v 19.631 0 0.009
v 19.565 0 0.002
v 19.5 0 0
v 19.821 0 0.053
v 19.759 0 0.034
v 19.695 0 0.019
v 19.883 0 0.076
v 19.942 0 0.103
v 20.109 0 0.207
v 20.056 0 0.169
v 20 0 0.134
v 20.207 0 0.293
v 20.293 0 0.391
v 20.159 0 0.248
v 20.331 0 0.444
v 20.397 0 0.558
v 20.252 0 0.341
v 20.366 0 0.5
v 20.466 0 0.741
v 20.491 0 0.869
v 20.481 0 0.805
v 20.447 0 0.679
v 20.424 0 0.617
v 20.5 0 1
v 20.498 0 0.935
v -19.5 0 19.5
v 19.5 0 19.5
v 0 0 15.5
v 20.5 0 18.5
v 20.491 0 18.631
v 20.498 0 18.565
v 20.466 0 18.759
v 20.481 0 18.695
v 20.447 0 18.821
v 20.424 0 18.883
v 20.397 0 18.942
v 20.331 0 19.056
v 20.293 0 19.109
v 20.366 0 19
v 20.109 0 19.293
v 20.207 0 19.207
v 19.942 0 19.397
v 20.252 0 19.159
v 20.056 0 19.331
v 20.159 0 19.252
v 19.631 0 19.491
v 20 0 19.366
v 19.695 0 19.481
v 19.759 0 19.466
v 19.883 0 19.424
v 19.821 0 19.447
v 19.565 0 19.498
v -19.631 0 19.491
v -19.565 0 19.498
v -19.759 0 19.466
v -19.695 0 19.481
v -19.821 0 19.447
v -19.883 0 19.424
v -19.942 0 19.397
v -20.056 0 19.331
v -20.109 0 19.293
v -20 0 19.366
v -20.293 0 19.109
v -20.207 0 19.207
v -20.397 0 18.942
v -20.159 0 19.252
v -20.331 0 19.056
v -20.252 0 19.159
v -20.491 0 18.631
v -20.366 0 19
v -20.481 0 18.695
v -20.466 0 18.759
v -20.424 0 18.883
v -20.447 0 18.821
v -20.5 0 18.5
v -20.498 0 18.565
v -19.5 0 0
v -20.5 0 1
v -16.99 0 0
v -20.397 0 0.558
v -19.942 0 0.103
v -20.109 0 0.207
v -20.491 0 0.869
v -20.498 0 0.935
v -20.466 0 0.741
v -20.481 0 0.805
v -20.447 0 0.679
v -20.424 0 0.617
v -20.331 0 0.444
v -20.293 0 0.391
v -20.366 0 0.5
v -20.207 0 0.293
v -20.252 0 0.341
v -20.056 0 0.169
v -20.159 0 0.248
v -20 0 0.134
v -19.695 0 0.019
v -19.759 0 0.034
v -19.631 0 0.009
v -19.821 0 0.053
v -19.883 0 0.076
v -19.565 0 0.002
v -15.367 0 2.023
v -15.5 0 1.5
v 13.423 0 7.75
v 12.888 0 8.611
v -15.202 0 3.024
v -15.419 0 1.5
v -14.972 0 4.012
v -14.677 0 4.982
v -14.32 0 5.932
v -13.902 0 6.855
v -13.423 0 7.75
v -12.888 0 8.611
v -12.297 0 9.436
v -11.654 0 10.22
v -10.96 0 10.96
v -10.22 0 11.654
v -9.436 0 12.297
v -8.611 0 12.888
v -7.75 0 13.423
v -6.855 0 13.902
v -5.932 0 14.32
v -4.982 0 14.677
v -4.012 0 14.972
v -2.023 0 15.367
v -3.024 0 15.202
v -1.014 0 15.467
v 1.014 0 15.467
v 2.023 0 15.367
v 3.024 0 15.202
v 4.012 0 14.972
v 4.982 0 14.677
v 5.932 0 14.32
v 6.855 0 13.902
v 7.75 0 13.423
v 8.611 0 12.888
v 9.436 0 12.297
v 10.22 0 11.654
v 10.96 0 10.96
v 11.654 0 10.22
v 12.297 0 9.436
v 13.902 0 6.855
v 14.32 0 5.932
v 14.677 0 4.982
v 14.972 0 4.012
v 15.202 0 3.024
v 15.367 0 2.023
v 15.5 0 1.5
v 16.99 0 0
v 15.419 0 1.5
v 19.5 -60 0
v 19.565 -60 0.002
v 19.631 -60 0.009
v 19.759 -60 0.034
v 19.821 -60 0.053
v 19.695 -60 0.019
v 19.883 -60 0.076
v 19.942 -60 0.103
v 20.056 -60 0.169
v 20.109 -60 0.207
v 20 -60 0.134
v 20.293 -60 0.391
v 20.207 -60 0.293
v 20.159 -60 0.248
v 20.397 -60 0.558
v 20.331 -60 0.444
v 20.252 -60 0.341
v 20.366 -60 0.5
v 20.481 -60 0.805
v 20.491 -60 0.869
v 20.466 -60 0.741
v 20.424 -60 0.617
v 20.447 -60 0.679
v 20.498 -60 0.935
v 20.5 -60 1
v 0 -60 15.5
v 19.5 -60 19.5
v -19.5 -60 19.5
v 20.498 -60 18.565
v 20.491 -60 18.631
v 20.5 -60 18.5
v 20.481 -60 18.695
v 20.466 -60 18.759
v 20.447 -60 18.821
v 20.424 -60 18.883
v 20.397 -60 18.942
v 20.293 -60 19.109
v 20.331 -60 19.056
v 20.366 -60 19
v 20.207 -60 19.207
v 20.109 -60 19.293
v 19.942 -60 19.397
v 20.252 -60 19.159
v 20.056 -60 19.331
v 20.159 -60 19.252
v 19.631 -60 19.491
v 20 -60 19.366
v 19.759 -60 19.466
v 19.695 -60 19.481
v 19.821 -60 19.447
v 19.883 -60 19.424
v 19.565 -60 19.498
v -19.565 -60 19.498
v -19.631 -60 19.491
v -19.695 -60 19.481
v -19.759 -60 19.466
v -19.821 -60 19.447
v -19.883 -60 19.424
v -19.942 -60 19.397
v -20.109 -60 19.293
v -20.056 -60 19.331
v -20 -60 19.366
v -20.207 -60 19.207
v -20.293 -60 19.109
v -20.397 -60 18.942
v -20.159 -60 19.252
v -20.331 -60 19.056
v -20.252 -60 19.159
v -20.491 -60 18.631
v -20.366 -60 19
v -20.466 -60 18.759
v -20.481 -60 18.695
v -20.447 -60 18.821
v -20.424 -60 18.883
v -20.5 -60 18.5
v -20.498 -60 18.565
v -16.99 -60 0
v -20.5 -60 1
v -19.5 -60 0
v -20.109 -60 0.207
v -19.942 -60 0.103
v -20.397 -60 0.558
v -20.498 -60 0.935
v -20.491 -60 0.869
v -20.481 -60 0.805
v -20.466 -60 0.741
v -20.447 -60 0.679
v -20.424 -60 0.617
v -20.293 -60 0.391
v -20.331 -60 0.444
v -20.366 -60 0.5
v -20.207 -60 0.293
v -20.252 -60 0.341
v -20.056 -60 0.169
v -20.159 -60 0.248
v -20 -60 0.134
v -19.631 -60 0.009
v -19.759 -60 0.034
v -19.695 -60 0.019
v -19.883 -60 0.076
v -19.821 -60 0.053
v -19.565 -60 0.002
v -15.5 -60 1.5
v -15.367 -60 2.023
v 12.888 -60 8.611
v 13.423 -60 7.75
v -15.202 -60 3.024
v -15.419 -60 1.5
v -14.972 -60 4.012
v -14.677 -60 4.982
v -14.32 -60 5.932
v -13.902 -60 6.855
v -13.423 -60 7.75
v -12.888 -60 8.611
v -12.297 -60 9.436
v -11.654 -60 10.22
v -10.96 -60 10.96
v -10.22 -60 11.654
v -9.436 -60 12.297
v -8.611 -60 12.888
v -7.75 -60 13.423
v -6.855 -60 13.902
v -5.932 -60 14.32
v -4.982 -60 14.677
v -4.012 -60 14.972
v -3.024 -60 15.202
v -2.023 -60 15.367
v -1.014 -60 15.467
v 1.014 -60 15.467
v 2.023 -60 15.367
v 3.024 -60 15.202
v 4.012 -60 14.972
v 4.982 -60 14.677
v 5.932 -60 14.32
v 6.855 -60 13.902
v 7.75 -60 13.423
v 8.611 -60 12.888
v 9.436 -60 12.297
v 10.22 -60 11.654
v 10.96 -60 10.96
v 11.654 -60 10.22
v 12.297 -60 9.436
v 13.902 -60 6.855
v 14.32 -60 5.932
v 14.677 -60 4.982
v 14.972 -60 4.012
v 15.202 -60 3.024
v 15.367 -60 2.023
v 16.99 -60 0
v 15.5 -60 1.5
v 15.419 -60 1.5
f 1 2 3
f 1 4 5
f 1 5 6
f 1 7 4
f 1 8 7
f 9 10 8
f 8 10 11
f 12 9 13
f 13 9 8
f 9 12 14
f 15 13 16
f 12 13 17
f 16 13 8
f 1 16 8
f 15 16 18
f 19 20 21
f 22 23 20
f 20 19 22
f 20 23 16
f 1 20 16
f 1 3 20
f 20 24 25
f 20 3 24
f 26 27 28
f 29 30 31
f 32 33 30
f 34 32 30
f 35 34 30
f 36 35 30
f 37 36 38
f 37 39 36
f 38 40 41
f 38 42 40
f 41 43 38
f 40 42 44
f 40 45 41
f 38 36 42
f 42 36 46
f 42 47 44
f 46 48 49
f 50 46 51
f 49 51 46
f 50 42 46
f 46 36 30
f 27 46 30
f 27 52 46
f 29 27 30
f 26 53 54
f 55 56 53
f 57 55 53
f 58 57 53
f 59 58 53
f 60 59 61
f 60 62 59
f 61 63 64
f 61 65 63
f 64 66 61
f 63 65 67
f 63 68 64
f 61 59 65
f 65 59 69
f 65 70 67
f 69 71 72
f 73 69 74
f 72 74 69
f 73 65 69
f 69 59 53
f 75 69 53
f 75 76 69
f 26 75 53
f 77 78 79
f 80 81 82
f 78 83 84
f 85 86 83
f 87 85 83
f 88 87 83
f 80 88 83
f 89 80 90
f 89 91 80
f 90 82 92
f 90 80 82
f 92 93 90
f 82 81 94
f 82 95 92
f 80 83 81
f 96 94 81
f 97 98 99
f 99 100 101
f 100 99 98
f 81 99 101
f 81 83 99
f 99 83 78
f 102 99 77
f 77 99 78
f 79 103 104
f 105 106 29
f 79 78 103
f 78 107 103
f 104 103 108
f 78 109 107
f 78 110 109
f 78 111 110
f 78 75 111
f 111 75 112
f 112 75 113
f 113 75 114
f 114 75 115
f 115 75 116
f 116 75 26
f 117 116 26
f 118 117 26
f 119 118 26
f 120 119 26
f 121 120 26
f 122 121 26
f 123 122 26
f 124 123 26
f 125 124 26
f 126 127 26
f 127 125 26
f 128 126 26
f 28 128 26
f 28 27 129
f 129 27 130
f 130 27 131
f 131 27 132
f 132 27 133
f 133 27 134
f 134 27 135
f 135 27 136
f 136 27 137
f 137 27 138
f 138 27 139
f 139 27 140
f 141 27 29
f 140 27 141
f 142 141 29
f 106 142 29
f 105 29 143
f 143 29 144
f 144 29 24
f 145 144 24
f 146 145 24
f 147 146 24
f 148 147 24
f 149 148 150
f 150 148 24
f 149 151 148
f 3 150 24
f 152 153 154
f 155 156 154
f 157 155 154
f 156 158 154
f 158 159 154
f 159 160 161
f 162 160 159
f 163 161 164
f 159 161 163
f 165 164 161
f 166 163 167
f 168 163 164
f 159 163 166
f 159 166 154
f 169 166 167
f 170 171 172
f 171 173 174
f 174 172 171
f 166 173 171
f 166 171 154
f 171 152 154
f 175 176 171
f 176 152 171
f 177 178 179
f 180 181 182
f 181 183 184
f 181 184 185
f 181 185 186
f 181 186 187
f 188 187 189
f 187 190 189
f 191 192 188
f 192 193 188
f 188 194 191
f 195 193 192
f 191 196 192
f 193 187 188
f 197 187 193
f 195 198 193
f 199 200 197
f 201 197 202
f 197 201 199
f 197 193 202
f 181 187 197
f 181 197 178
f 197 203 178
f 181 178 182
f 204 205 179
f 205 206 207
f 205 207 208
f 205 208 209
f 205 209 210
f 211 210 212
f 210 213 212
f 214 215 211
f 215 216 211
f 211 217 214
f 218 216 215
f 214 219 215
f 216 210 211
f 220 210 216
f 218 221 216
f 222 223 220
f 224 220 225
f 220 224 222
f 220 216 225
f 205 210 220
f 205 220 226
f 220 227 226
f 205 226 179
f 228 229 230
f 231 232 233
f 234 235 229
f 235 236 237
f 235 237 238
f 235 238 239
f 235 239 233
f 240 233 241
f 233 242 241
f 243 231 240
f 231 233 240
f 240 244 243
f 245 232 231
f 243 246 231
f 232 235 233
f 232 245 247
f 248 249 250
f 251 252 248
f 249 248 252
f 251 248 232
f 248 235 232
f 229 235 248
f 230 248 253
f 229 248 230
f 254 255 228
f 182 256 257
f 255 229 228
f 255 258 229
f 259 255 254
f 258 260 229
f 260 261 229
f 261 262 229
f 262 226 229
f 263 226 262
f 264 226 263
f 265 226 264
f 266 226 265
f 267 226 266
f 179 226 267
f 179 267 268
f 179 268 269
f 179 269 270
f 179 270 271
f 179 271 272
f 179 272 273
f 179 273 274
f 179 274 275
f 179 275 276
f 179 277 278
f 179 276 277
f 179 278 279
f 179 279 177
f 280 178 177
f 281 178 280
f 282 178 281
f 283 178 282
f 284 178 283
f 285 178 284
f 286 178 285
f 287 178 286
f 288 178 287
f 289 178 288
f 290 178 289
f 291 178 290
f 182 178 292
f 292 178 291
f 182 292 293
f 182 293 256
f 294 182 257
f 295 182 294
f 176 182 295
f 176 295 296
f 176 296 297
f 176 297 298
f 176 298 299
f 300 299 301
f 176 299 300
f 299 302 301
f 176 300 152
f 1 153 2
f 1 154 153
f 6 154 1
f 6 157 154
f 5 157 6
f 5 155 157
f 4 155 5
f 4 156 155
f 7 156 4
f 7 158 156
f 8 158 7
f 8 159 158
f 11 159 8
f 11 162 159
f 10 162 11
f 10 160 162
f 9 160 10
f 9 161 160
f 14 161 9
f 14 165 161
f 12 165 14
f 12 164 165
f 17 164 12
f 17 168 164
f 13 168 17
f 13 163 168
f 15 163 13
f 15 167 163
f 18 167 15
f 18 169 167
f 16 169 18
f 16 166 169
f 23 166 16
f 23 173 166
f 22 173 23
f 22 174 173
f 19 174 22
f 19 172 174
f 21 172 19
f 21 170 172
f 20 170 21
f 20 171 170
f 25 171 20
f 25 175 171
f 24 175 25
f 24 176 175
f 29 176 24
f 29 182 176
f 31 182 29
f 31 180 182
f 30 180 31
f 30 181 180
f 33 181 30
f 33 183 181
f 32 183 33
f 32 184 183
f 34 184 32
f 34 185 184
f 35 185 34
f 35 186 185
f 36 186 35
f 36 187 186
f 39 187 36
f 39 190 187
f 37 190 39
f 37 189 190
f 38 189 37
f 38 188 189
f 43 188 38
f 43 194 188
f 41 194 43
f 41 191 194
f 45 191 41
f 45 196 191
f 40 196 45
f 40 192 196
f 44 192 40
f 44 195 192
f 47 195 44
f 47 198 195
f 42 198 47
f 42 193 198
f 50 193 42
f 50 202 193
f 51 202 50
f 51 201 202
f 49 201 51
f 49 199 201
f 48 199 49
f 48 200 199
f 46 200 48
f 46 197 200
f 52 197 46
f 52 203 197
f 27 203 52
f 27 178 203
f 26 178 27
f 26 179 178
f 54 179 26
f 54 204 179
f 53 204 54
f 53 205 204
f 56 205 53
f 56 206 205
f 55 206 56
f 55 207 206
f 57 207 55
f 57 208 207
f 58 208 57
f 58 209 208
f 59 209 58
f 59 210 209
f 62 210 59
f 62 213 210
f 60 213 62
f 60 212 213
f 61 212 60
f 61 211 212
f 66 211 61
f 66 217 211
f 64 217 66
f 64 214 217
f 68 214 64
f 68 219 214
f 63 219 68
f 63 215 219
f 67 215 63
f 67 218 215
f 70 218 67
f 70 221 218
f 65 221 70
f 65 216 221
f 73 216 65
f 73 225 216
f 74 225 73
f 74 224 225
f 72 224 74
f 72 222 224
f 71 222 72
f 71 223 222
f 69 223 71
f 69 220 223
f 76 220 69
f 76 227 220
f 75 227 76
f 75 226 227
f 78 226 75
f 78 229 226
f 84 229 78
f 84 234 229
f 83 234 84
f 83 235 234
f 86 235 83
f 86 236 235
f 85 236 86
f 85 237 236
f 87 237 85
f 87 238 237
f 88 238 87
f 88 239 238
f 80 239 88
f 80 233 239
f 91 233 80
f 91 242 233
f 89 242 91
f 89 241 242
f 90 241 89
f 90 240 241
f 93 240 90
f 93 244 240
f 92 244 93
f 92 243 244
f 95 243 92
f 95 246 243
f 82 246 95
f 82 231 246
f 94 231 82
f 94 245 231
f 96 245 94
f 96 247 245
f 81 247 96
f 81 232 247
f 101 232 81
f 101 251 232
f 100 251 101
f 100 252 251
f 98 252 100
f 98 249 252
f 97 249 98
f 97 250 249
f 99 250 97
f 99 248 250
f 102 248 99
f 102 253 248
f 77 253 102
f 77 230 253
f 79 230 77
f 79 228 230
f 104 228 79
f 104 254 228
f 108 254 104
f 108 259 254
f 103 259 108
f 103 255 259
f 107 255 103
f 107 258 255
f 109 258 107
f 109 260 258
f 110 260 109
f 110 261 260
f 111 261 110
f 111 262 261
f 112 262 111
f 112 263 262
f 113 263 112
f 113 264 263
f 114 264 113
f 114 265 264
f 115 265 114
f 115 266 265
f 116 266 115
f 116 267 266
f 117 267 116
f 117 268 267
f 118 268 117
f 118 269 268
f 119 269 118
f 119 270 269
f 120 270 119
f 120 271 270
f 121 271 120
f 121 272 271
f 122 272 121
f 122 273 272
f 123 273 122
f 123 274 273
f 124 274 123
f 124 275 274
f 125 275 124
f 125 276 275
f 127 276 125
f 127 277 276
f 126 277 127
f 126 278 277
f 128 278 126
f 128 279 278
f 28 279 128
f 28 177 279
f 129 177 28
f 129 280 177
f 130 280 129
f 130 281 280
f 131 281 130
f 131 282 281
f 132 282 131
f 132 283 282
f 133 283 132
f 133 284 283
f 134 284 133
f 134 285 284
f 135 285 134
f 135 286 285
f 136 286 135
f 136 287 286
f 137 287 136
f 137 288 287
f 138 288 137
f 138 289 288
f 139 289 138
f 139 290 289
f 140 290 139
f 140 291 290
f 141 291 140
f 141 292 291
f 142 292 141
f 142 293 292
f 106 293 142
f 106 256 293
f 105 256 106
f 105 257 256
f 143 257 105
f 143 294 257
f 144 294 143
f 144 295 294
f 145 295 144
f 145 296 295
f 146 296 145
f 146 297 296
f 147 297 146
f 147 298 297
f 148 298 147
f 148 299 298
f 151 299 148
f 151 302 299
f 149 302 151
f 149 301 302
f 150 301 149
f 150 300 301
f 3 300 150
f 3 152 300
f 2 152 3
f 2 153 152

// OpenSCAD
// Berço para Casio CT-S300 em suporte X
// Cola-se a face plana (topo) no fundo do teclado com fita dupla face;
// o canal de baixo encaixa sobre o braço do suporte e impede o teclado de escorregar.
// Abra no OpenSCAD (ou no Customizer do MakerWorld/Thingiverse), ajuste e exporte STL.

/* [Braço do suporte — MEÇA o seu, incluindo a espuma/borracha] */
formato = "redondo"; // [redondo, quadrado]
diametro_braco = 30;   // mm (largura do tubo, se quadrado)
folga = 1.0;           // mm, folga total no canal

/* [Peça] */
comprimento = 60;      // mm, ao longo do braço
parede = 5;            // mm, paredes laterais
espessura_topo = 4;    // mm, acima do canal (face colada)
profundidade = 0.5;    // fração do braço que entra no canal (0.3–0.6)
chanfro_entrada = 1.5; // mm

$fn = 96;
r  = diametro_braco/2 + folga/2;
W  = 2*r + 2*parede;
hc = profundidade * 2*r;
H  = hc + espessura_topo;

module perfil() {
    difference() {
        offset(r=1) offset(delta=-1) translate([-W/2, 0]) square([W, H]);
        if (formato == "redondo") {
            translate([0, hc - r]) circle(r);
        } else {
            translate([-r, -1]) square([2*r, hc + 1]);
        }
        // chanfro na entrada do canal
        polygon([[-r - chanfro_entrada, -0.01], [-r, chanfro_entrada],
                 [ r, chanfro_entrada], [ r + chanfro_entrada, -0.01]]);
    }
}

// Impressão: no fatiador, deite a peça com a face colada (topo plano) na mesa.
rotate([90, 0, 0]) linear_extrude(comprimento) perfil();
